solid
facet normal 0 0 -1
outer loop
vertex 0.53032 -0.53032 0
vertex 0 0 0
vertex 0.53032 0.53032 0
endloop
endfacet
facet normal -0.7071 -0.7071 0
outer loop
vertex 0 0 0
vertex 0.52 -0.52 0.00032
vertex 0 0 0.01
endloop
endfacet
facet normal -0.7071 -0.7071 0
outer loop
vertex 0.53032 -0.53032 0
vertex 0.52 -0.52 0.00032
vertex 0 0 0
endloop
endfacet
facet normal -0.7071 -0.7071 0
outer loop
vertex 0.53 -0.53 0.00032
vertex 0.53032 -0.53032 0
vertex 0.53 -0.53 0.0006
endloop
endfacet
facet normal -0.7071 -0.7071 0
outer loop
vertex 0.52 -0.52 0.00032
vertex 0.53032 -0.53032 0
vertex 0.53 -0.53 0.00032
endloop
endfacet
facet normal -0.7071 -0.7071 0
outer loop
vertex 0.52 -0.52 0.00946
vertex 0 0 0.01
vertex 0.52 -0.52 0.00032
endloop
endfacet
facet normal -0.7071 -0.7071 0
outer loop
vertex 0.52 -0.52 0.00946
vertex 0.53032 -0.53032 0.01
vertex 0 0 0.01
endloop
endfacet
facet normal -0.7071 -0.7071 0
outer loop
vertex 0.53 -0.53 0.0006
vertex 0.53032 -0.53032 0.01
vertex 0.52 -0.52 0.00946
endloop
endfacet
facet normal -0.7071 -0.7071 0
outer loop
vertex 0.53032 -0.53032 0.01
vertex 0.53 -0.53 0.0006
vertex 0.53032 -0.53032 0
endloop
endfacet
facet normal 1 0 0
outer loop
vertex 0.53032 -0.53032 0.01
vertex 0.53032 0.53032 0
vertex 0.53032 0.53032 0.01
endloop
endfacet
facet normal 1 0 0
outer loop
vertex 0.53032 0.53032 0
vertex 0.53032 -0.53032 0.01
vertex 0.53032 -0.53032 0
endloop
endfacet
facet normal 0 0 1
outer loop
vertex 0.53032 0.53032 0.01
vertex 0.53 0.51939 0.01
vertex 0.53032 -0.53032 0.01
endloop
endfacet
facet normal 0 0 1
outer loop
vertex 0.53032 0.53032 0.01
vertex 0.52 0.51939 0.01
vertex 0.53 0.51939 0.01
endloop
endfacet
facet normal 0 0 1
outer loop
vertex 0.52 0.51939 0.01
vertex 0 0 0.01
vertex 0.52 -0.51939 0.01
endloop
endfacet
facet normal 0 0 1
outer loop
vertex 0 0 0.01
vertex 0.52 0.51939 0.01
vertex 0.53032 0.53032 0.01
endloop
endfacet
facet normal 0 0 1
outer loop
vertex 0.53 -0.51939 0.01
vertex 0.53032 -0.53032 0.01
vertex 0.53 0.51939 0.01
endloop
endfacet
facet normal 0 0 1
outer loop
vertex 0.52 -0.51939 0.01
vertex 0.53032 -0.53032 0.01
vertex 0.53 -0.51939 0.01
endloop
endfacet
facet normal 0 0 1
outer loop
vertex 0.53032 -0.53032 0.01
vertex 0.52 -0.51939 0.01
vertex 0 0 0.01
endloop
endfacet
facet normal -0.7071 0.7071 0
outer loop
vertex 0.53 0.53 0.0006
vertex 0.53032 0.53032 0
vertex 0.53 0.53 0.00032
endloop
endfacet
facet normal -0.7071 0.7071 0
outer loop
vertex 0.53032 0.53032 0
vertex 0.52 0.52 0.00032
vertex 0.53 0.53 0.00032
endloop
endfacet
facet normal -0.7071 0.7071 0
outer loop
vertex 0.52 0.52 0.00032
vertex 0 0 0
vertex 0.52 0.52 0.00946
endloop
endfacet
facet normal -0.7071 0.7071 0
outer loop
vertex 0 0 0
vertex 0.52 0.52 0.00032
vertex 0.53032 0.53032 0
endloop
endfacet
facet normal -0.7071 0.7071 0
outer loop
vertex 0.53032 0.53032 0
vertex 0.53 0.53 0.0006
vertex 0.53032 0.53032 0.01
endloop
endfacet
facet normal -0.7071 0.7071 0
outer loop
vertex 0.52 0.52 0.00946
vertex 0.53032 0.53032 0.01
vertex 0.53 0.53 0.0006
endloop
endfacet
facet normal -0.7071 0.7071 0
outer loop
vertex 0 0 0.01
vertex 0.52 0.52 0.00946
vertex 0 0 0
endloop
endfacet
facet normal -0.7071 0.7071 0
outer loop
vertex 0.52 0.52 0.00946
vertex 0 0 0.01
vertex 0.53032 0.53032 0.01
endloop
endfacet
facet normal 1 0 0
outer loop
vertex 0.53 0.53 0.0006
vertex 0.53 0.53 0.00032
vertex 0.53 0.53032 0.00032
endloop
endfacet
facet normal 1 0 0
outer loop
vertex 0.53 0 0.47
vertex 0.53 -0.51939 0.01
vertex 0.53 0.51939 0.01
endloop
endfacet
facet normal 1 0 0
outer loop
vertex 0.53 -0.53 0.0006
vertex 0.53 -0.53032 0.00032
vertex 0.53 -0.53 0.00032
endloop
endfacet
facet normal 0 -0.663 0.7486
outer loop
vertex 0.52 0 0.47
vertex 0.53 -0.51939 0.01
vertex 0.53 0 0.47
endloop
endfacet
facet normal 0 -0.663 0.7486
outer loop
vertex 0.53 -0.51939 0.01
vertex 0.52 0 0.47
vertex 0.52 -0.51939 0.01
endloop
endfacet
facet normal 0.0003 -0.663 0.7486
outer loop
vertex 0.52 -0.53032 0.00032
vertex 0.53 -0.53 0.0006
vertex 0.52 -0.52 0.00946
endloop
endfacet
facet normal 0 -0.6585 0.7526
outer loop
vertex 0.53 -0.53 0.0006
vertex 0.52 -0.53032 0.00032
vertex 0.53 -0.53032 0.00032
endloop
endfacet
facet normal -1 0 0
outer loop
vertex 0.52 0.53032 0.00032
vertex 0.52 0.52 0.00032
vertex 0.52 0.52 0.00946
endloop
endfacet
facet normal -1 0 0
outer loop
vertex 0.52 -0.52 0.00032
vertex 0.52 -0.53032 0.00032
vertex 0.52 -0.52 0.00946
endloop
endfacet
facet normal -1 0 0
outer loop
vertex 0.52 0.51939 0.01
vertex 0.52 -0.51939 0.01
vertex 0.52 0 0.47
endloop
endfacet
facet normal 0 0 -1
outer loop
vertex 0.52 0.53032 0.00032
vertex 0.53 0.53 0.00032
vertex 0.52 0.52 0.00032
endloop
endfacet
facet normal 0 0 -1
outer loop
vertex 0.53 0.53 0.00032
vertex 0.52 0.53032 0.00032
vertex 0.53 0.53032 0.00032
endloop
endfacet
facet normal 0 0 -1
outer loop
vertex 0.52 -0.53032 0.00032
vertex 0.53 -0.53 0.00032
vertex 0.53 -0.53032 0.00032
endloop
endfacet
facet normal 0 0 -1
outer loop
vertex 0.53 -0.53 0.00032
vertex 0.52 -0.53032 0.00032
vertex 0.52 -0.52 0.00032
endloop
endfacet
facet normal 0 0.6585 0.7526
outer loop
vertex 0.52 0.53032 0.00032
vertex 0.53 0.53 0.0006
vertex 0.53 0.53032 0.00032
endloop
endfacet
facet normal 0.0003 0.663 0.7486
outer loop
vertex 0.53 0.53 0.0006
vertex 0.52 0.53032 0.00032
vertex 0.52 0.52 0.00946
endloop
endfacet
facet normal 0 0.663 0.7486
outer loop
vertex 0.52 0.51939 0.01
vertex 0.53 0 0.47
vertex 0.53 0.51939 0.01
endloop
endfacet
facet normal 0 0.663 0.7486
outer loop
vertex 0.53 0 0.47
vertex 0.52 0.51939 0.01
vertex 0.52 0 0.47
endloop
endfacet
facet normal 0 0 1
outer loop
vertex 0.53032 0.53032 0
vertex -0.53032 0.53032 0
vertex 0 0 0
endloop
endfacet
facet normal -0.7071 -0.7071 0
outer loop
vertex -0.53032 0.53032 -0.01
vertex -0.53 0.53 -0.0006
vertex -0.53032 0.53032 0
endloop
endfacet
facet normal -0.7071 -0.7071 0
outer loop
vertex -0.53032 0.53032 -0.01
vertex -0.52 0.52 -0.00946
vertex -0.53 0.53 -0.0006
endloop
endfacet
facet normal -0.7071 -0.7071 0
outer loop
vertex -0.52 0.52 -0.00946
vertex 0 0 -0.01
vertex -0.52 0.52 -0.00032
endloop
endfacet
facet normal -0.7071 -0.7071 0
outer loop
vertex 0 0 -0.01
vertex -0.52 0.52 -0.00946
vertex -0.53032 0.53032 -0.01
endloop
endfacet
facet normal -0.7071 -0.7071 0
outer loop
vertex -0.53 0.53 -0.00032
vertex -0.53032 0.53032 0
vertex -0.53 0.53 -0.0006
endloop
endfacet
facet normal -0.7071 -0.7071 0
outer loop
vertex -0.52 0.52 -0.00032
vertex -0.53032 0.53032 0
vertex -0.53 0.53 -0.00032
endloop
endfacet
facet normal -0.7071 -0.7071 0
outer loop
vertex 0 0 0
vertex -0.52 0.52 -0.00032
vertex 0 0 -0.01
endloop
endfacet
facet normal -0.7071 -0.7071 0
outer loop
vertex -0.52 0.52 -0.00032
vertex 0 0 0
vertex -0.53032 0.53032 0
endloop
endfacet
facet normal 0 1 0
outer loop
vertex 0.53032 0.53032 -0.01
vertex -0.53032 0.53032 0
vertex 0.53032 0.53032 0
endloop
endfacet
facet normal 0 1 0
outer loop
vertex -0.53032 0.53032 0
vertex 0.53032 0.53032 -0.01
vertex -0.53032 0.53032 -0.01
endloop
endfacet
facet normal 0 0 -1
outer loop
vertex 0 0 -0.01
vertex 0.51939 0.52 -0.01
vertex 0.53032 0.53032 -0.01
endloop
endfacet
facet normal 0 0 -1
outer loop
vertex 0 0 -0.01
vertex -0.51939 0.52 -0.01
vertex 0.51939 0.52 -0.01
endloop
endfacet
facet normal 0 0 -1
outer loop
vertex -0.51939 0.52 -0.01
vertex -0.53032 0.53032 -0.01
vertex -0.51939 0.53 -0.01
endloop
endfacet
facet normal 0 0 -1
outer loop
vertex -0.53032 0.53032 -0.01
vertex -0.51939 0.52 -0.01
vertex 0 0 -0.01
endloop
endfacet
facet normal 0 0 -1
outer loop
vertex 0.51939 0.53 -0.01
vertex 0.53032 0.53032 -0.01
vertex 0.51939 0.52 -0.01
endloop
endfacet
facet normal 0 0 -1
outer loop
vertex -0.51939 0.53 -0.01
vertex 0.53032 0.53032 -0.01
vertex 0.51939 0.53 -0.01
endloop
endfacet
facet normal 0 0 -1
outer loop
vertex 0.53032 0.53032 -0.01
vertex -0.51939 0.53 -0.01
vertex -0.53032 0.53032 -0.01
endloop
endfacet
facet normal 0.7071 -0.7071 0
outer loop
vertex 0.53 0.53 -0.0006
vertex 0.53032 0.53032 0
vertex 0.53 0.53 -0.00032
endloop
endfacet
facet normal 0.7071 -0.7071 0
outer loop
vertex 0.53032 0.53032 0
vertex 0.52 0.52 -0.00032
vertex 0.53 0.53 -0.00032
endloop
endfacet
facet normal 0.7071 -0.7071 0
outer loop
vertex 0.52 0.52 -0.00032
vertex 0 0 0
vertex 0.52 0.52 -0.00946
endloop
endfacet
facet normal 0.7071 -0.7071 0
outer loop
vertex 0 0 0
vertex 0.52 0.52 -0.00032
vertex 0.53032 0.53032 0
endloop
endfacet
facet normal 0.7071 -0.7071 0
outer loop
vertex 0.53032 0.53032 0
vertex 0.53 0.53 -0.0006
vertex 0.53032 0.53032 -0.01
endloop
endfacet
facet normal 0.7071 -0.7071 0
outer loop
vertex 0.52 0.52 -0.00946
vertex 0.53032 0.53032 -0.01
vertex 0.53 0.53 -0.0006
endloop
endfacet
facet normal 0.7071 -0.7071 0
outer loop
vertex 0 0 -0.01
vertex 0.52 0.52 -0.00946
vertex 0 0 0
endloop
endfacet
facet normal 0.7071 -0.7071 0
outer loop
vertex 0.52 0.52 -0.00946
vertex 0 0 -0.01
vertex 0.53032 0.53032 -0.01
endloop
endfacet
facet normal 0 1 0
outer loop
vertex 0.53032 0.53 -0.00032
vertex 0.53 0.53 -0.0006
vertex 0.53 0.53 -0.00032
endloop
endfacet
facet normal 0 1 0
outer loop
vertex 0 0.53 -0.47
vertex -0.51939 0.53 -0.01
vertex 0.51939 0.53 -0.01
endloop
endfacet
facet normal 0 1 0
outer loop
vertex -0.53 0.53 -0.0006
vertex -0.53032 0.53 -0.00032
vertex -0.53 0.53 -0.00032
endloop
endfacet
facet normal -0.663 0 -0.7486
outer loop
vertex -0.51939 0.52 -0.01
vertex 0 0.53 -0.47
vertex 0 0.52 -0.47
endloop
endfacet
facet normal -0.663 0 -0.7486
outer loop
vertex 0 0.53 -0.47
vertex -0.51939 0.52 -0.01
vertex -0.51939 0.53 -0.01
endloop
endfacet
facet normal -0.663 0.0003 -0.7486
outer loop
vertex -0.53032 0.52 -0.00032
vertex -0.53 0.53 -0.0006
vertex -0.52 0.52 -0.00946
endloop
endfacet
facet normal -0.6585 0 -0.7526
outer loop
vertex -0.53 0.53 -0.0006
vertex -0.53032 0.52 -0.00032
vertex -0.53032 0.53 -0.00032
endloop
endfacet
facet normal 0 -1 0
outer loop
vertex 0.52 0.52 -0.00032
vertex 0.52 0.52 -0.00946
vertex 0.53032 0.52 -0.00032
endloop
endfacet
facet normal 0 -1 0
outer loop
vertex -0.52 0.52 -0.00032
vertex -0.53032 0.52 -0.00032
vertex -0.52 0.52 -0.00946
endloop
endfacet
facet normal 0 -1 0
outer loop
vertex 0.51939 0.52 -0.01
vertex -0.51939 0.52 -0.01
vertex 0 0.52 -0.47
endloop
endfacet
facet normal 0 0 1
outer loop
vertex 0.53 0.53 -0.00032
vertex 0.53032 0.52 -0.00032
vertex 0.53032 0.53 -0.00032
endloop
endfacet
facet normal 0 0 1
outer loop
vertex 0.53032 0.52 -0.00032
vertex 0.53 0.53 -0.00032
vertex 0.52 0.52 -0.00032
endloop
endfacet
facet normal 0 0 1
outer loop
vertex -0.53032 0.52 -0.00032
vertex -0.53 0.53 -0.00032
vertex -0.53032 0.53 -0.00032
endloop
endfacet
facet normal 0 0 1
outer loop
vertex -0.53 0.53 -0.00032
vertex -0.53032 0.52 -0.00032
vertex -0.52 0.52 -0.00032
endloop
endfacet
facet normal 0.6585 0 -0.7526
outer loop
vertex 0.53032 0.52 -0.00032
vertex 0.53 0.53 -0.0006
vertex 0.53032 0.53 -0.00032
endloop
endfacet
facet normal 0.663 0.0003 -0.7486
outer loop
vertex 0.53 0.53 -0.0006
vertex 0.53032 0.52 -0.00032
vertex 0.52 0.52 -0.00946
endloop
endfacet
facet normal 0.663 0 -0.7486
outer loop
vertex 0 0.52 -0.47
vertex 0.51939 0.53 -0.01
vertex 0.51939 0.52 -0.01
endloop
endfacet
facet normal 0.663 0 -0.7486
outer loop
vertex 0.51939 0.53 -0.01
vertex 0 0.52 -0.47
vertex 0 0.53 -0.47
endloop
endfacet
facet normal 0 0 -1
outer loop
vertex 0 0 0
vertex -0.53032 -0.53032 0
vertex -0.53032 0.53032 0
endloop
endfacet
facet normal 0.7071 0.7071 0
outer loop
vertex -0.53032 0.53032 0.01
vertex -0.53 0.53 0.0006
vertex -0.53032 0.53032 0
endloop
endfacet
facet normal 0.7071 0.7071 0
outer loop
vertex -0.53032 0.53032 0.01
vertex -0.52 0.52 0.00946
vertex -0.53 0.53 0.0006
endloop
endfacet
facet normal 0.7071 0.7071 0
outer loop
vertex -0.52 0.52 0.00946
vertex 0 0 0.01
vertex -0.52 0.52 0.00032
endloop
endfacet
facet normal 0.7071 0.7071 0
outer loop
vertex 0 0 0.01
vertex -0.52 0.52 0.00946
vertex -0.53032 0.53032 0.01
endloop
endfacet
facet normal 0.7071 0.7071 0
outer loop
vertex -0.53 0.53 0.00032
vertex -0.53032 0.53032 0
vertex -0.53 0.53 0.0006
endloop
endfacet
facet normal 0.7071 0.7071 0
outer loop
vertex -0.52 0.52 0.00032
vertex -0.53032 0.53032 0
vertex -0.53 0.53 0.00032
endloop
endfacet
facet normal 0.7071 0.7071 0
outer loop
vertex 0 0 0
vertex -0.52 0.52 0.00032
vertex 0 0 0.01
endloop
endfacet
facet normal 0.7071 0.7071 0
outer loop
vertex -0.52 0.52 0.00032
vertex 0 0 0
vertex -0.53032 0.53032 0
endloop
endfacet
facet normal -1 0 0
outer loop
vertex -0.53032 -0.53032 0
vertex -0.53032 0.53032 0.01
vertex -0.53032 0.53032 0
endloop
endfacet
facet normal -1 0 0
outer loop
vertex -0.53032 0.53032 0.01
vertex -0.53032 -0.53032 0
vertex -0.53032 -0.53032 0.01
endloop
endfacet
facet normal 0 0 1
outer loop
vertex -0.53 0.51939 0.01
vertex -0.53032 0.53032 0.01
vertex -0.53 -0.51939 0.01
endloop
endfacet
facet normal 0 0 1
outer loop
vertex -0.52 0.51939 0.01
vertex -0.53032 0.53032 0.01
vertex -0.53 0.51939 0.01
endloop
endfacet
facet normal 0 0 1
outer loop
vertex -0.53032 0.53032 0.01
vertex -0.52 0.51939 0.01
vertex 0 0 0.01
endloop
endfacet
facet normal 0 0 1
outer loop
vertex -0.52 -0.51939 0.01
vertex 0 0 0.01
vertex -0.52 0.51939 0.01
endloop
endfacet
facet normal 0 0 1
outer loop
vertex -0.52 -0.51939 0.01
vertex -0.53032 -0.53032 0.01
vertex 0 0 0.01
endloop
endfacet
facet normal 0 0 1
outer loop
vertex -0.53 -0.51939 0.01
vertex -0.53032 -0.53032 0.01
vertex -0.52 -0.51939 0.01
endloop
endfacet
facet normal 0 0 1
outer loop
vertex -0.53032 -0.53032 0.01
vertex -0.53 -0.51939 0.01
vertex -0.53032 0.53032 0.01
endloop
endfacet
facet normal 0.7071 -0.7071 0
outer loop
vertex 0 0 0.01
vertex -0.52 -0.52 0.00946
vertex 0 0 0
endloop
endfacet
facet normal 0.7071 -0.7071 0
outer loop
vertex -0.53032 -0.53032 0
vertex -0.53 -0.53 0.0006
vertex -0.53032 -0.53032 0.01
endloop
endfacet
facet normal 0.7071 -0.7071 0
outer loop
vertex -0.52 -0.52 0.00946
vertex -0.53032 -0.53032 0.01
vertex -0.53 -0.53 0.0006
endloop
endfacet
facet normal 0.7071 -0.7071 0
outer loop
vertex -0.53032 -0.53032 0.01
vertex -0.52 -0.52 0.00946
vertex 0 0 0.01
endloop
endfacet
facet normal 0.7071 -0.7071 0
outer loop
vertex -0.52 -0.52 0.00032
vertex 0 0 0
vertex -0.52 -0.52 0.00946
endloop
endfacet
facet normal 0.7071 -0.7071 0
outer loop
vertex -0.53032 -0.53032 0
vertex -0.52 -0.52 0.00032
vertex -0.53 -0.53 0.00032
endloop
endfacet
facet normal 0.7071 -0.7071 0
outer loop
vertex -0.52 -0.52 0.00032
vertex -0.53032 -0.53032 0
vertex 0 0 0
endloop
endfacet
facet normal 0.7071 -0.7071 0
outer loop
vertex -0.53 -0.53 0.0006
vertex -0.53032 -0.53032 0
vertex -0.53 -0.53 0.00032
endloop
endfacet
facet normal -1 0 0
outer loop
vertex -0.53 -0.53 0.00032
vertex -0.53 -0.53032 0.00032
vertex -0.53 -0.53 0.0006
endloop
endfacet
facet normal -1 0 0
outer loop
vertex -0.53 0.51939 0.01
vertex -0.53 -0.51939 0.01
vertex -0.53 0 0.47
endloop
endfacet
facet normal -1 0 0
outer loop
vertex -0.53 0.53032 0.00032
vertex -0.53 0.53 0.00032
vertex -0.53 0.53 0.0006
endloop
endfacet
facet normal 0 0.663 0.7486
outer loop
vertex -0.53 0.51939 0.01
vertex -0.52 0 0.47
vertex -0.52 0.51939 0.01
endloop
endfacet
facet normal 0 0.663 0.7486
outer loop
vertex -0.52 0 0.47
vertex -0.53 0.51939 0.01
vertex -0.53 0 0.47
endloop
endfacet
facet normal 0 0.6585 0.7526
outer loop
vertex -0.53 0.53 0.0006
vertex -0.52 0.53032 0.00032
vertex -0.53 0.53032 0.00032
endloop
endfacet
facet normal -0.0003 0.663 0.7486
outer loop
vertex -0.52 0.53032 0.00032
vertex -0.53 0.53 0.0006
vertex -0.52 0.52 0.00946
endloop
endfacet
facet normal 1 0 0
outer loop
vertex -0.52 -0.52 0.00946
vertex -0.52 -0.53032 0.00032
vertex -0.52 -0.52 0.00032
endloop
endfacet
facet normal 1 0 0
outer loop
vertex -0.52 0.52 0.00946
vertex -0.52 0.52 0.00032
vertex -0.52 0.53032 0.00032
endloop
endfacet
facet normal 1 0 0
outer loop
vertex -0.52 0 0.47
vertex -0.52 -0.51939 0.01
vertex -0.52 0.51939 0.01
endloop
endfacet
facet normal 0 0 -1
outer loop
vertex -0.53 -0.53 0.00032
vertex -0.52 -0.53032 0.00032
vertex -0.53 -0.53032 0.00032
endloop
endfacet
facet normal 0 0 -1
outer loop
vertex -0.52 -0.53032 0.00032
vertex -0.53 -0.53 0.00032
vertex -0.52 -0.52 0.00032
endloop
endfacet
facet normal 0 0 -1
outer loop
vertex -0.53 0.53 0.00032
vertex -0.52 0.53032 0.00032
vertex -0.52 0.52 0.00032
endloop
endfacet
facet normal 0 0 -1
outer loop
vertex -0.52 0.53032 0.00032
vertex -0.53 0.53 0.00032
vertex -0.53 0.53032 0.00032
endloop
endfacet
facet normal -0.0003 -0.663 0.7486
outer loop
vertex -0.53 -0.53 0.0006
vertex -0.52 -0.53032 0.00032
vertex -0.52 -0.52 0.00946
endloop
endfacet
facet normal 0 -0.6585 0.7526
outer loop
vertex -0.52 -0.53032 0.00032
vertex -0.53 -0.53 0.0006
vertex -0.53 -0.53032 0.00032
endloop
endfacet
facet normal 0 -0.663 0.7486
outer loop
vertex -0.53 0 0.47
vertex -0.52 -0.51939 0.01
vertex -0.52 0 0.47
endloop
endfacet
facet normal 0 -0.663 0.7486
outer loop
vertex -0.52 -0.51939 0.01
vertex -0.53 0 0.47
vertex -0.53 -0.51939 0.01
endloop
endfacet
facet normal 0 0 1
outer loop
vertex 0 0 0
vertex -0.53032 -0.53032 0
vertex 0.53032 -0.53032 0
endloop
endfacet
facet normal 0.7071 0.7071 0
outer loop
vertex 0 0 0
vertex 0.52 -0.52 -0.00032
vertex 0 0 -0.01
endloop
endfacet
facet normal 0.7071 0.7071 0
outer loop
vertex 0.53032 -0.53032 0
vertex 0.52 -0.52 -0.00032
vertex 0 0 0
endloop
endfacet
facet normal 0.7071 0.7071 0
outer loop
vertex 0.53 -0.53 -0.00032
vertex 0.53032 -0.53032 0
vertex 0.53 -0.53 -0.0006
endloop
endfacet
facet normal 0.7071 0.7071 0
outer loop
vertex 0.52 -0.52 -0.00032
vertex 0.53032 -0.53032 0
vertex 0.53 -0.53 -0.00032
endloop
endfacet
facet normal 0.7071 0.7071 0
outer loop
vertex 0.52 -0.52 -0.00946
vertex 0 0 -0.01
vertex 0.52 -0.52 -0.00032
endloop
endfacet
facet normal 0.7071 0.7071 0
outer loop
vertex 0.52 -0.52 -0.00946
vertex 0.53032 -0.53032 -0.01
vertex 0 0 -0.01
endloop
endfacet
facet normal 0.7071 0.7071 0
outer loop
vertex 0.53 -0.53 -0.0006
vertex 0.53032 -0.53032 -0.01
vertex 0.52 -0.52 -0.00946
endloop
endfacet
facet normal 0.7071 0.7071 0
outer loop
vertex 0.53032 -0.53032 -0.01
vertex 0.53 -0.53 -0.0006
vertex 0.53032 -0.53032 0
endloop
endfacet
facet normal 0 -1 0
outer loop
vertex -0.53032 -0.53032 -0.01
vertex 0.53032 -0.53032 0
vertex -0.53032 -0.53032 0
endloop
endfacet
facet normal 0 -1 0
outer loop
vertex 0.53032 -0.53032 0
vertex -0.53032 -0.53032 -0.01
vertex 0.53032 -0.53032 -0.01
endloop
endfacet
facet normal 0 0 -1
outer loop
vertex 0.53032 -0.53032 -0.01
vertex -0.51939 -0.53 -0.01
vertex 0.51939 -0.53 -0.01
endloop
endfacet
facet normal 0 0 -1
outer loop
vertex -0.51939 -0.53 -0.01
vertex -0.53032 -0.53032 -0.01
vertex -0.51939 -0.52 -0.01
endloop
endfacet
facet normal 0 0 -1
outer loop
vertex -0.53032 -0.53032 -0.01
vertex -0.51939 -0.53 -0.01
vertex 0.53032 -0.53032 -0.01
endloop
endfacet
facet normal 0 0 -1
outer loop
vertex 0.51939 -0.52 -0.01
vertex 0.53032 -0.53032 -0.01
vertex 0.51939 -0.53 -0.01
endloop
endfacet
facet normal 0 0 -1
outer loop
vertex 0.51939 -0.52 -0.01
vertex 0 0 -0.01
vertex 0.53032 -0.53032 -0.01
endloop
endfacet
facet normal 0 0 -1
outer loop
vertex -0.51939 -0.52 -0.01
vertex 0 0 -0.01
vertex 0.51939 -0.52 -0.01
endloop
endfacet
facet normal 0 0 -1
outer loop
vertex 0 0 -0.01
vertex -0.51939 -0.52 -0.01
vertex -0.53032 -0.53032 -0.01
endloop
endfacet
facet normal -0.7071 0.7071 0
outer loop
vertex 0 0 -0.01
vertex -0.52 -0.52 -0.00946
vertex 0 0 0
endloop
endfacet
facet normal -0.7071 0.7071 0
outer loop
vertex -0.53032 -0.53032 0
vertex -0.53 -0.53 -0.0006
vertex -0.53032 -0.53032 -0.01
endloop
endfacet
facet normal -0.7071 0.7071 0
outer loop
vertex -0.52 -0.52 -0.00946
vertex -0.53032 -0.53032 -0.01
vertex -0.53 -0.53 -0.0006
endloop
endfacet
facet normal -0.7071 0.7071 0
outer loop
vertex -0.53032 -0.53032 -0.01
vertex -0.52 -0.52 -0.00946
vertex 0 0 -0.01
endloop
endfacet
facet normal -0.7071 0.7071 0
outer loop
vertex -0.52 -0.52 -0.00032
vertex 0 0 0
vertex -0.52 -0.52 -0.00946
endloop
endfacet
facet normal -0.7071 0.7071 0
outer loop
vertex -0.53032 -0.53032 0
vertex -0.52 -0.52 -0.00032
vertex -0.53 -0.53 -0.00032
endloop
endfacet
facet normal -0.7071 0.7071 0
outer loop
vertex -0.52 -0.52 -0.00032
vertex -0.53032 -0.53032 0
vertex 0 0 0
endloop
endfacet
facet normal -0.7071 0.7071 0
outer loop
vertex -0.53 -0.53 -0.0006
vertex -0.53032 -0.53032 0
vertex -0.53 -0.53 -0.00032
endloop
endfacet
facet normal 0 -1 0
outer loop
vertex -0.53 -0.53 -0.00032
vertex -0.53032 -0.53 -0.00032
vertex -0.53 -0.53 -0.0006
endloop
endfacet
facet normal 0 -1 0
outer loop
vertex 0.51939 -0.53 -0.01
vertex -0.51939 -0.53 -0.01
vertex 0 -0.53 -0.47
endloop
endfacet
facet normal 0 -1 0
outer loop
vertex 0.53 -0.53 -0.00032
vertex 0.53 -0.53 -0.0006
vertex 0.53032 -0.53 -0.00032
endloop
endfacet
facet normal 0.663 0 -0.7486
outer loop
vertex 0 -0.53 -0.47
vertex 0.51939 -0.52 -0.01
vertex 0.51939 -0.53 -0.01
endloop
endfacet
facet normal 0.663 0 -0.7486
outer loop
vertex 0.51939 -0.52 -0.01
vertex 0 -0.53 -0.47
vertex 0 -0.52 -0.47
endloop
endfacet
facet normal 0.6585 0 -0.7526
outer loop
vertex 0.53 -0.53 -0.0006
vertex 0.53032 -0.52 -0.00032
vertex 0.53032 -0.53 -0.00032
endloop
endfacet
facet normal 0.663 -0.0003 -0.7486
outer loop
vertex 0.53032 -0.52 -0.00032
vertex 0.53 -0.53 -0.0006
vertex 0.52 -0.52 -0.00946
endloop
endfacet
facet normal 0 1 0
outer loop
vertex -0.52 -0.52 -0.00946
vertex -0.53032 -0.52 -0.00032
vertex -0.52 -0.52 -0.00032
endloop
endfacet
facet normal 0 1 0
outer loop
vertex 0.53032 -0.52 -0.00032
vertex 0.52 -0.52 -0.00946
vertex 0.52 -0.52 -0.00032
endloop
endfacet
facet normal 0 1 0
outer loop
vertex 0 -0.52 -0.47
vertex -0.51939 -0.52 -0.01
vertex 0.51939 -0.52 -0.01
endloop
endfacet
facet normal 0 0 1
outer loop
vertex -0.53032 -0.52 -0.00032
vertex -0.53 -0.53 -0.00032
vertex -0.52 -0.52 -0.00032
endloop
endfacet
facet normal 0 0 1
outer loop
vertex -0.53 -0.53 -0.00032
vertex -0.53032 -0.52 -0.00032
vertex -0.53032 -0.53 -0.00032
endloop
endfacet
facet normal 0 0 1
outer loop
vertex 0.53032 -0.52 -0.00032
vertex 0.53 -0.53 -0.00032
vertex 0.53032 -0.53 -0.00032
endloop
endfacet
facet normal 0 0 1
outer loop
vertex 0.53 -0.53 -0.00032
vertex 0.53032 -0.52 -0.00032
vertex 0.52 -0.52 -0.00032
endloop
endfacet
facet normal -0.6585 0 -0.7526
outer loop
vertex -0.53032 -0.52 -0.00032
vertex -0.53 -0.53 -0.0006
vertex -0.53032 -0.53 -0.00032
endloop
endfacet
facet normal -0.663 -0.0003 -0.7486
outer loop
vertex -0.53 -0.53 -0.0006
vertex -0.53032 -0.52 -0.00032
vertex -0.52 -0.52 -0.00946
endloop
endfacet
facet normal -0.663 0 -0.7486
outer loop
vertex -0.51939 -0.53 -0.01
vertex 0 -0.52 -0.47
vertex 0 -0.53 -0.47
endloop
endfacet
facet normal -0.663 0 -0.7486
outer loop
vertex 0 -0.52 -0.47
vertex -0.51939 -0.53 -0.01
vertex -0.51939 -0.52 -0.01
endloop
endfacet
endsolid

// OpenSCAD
// dowel pin locdator design.

$fn=35;

ir = 0.25;
or = 0.75;
fab_or = 1;
theta = 360/8;
//polygon(points = [ [x, y], ... ], paths = [ [p1, p2, p3..], ...], convexity = N);

module tine(){
  union(){
  linear_extrude(0.01)polygon( [[0,0], [or*cos(theta),or*sin(theta)], [or*cos(-theta),or*sin(-theta)]]);
  translate([or,0,0.22])rotate([0,-90,0])translate([-or,0,0.22])linear_extrude(0.01)polygon( [[or*cos(theta), or*sin(theta)],[or*cos(-theta), or*sin(-theta)], [fab_or*cos(0),fab_or*sin(0)]]);
  }
}
//tine();
// for(variable = [start : increment : end])

for (phi =[0:359/45]) {
  if (phi % 2 == 0 ){
    rotate([0,0,phi*90])tine();
  }
  else  { 
    rotate([0,0,phi*90])rotate([180,0,0])tine();
  }
}
